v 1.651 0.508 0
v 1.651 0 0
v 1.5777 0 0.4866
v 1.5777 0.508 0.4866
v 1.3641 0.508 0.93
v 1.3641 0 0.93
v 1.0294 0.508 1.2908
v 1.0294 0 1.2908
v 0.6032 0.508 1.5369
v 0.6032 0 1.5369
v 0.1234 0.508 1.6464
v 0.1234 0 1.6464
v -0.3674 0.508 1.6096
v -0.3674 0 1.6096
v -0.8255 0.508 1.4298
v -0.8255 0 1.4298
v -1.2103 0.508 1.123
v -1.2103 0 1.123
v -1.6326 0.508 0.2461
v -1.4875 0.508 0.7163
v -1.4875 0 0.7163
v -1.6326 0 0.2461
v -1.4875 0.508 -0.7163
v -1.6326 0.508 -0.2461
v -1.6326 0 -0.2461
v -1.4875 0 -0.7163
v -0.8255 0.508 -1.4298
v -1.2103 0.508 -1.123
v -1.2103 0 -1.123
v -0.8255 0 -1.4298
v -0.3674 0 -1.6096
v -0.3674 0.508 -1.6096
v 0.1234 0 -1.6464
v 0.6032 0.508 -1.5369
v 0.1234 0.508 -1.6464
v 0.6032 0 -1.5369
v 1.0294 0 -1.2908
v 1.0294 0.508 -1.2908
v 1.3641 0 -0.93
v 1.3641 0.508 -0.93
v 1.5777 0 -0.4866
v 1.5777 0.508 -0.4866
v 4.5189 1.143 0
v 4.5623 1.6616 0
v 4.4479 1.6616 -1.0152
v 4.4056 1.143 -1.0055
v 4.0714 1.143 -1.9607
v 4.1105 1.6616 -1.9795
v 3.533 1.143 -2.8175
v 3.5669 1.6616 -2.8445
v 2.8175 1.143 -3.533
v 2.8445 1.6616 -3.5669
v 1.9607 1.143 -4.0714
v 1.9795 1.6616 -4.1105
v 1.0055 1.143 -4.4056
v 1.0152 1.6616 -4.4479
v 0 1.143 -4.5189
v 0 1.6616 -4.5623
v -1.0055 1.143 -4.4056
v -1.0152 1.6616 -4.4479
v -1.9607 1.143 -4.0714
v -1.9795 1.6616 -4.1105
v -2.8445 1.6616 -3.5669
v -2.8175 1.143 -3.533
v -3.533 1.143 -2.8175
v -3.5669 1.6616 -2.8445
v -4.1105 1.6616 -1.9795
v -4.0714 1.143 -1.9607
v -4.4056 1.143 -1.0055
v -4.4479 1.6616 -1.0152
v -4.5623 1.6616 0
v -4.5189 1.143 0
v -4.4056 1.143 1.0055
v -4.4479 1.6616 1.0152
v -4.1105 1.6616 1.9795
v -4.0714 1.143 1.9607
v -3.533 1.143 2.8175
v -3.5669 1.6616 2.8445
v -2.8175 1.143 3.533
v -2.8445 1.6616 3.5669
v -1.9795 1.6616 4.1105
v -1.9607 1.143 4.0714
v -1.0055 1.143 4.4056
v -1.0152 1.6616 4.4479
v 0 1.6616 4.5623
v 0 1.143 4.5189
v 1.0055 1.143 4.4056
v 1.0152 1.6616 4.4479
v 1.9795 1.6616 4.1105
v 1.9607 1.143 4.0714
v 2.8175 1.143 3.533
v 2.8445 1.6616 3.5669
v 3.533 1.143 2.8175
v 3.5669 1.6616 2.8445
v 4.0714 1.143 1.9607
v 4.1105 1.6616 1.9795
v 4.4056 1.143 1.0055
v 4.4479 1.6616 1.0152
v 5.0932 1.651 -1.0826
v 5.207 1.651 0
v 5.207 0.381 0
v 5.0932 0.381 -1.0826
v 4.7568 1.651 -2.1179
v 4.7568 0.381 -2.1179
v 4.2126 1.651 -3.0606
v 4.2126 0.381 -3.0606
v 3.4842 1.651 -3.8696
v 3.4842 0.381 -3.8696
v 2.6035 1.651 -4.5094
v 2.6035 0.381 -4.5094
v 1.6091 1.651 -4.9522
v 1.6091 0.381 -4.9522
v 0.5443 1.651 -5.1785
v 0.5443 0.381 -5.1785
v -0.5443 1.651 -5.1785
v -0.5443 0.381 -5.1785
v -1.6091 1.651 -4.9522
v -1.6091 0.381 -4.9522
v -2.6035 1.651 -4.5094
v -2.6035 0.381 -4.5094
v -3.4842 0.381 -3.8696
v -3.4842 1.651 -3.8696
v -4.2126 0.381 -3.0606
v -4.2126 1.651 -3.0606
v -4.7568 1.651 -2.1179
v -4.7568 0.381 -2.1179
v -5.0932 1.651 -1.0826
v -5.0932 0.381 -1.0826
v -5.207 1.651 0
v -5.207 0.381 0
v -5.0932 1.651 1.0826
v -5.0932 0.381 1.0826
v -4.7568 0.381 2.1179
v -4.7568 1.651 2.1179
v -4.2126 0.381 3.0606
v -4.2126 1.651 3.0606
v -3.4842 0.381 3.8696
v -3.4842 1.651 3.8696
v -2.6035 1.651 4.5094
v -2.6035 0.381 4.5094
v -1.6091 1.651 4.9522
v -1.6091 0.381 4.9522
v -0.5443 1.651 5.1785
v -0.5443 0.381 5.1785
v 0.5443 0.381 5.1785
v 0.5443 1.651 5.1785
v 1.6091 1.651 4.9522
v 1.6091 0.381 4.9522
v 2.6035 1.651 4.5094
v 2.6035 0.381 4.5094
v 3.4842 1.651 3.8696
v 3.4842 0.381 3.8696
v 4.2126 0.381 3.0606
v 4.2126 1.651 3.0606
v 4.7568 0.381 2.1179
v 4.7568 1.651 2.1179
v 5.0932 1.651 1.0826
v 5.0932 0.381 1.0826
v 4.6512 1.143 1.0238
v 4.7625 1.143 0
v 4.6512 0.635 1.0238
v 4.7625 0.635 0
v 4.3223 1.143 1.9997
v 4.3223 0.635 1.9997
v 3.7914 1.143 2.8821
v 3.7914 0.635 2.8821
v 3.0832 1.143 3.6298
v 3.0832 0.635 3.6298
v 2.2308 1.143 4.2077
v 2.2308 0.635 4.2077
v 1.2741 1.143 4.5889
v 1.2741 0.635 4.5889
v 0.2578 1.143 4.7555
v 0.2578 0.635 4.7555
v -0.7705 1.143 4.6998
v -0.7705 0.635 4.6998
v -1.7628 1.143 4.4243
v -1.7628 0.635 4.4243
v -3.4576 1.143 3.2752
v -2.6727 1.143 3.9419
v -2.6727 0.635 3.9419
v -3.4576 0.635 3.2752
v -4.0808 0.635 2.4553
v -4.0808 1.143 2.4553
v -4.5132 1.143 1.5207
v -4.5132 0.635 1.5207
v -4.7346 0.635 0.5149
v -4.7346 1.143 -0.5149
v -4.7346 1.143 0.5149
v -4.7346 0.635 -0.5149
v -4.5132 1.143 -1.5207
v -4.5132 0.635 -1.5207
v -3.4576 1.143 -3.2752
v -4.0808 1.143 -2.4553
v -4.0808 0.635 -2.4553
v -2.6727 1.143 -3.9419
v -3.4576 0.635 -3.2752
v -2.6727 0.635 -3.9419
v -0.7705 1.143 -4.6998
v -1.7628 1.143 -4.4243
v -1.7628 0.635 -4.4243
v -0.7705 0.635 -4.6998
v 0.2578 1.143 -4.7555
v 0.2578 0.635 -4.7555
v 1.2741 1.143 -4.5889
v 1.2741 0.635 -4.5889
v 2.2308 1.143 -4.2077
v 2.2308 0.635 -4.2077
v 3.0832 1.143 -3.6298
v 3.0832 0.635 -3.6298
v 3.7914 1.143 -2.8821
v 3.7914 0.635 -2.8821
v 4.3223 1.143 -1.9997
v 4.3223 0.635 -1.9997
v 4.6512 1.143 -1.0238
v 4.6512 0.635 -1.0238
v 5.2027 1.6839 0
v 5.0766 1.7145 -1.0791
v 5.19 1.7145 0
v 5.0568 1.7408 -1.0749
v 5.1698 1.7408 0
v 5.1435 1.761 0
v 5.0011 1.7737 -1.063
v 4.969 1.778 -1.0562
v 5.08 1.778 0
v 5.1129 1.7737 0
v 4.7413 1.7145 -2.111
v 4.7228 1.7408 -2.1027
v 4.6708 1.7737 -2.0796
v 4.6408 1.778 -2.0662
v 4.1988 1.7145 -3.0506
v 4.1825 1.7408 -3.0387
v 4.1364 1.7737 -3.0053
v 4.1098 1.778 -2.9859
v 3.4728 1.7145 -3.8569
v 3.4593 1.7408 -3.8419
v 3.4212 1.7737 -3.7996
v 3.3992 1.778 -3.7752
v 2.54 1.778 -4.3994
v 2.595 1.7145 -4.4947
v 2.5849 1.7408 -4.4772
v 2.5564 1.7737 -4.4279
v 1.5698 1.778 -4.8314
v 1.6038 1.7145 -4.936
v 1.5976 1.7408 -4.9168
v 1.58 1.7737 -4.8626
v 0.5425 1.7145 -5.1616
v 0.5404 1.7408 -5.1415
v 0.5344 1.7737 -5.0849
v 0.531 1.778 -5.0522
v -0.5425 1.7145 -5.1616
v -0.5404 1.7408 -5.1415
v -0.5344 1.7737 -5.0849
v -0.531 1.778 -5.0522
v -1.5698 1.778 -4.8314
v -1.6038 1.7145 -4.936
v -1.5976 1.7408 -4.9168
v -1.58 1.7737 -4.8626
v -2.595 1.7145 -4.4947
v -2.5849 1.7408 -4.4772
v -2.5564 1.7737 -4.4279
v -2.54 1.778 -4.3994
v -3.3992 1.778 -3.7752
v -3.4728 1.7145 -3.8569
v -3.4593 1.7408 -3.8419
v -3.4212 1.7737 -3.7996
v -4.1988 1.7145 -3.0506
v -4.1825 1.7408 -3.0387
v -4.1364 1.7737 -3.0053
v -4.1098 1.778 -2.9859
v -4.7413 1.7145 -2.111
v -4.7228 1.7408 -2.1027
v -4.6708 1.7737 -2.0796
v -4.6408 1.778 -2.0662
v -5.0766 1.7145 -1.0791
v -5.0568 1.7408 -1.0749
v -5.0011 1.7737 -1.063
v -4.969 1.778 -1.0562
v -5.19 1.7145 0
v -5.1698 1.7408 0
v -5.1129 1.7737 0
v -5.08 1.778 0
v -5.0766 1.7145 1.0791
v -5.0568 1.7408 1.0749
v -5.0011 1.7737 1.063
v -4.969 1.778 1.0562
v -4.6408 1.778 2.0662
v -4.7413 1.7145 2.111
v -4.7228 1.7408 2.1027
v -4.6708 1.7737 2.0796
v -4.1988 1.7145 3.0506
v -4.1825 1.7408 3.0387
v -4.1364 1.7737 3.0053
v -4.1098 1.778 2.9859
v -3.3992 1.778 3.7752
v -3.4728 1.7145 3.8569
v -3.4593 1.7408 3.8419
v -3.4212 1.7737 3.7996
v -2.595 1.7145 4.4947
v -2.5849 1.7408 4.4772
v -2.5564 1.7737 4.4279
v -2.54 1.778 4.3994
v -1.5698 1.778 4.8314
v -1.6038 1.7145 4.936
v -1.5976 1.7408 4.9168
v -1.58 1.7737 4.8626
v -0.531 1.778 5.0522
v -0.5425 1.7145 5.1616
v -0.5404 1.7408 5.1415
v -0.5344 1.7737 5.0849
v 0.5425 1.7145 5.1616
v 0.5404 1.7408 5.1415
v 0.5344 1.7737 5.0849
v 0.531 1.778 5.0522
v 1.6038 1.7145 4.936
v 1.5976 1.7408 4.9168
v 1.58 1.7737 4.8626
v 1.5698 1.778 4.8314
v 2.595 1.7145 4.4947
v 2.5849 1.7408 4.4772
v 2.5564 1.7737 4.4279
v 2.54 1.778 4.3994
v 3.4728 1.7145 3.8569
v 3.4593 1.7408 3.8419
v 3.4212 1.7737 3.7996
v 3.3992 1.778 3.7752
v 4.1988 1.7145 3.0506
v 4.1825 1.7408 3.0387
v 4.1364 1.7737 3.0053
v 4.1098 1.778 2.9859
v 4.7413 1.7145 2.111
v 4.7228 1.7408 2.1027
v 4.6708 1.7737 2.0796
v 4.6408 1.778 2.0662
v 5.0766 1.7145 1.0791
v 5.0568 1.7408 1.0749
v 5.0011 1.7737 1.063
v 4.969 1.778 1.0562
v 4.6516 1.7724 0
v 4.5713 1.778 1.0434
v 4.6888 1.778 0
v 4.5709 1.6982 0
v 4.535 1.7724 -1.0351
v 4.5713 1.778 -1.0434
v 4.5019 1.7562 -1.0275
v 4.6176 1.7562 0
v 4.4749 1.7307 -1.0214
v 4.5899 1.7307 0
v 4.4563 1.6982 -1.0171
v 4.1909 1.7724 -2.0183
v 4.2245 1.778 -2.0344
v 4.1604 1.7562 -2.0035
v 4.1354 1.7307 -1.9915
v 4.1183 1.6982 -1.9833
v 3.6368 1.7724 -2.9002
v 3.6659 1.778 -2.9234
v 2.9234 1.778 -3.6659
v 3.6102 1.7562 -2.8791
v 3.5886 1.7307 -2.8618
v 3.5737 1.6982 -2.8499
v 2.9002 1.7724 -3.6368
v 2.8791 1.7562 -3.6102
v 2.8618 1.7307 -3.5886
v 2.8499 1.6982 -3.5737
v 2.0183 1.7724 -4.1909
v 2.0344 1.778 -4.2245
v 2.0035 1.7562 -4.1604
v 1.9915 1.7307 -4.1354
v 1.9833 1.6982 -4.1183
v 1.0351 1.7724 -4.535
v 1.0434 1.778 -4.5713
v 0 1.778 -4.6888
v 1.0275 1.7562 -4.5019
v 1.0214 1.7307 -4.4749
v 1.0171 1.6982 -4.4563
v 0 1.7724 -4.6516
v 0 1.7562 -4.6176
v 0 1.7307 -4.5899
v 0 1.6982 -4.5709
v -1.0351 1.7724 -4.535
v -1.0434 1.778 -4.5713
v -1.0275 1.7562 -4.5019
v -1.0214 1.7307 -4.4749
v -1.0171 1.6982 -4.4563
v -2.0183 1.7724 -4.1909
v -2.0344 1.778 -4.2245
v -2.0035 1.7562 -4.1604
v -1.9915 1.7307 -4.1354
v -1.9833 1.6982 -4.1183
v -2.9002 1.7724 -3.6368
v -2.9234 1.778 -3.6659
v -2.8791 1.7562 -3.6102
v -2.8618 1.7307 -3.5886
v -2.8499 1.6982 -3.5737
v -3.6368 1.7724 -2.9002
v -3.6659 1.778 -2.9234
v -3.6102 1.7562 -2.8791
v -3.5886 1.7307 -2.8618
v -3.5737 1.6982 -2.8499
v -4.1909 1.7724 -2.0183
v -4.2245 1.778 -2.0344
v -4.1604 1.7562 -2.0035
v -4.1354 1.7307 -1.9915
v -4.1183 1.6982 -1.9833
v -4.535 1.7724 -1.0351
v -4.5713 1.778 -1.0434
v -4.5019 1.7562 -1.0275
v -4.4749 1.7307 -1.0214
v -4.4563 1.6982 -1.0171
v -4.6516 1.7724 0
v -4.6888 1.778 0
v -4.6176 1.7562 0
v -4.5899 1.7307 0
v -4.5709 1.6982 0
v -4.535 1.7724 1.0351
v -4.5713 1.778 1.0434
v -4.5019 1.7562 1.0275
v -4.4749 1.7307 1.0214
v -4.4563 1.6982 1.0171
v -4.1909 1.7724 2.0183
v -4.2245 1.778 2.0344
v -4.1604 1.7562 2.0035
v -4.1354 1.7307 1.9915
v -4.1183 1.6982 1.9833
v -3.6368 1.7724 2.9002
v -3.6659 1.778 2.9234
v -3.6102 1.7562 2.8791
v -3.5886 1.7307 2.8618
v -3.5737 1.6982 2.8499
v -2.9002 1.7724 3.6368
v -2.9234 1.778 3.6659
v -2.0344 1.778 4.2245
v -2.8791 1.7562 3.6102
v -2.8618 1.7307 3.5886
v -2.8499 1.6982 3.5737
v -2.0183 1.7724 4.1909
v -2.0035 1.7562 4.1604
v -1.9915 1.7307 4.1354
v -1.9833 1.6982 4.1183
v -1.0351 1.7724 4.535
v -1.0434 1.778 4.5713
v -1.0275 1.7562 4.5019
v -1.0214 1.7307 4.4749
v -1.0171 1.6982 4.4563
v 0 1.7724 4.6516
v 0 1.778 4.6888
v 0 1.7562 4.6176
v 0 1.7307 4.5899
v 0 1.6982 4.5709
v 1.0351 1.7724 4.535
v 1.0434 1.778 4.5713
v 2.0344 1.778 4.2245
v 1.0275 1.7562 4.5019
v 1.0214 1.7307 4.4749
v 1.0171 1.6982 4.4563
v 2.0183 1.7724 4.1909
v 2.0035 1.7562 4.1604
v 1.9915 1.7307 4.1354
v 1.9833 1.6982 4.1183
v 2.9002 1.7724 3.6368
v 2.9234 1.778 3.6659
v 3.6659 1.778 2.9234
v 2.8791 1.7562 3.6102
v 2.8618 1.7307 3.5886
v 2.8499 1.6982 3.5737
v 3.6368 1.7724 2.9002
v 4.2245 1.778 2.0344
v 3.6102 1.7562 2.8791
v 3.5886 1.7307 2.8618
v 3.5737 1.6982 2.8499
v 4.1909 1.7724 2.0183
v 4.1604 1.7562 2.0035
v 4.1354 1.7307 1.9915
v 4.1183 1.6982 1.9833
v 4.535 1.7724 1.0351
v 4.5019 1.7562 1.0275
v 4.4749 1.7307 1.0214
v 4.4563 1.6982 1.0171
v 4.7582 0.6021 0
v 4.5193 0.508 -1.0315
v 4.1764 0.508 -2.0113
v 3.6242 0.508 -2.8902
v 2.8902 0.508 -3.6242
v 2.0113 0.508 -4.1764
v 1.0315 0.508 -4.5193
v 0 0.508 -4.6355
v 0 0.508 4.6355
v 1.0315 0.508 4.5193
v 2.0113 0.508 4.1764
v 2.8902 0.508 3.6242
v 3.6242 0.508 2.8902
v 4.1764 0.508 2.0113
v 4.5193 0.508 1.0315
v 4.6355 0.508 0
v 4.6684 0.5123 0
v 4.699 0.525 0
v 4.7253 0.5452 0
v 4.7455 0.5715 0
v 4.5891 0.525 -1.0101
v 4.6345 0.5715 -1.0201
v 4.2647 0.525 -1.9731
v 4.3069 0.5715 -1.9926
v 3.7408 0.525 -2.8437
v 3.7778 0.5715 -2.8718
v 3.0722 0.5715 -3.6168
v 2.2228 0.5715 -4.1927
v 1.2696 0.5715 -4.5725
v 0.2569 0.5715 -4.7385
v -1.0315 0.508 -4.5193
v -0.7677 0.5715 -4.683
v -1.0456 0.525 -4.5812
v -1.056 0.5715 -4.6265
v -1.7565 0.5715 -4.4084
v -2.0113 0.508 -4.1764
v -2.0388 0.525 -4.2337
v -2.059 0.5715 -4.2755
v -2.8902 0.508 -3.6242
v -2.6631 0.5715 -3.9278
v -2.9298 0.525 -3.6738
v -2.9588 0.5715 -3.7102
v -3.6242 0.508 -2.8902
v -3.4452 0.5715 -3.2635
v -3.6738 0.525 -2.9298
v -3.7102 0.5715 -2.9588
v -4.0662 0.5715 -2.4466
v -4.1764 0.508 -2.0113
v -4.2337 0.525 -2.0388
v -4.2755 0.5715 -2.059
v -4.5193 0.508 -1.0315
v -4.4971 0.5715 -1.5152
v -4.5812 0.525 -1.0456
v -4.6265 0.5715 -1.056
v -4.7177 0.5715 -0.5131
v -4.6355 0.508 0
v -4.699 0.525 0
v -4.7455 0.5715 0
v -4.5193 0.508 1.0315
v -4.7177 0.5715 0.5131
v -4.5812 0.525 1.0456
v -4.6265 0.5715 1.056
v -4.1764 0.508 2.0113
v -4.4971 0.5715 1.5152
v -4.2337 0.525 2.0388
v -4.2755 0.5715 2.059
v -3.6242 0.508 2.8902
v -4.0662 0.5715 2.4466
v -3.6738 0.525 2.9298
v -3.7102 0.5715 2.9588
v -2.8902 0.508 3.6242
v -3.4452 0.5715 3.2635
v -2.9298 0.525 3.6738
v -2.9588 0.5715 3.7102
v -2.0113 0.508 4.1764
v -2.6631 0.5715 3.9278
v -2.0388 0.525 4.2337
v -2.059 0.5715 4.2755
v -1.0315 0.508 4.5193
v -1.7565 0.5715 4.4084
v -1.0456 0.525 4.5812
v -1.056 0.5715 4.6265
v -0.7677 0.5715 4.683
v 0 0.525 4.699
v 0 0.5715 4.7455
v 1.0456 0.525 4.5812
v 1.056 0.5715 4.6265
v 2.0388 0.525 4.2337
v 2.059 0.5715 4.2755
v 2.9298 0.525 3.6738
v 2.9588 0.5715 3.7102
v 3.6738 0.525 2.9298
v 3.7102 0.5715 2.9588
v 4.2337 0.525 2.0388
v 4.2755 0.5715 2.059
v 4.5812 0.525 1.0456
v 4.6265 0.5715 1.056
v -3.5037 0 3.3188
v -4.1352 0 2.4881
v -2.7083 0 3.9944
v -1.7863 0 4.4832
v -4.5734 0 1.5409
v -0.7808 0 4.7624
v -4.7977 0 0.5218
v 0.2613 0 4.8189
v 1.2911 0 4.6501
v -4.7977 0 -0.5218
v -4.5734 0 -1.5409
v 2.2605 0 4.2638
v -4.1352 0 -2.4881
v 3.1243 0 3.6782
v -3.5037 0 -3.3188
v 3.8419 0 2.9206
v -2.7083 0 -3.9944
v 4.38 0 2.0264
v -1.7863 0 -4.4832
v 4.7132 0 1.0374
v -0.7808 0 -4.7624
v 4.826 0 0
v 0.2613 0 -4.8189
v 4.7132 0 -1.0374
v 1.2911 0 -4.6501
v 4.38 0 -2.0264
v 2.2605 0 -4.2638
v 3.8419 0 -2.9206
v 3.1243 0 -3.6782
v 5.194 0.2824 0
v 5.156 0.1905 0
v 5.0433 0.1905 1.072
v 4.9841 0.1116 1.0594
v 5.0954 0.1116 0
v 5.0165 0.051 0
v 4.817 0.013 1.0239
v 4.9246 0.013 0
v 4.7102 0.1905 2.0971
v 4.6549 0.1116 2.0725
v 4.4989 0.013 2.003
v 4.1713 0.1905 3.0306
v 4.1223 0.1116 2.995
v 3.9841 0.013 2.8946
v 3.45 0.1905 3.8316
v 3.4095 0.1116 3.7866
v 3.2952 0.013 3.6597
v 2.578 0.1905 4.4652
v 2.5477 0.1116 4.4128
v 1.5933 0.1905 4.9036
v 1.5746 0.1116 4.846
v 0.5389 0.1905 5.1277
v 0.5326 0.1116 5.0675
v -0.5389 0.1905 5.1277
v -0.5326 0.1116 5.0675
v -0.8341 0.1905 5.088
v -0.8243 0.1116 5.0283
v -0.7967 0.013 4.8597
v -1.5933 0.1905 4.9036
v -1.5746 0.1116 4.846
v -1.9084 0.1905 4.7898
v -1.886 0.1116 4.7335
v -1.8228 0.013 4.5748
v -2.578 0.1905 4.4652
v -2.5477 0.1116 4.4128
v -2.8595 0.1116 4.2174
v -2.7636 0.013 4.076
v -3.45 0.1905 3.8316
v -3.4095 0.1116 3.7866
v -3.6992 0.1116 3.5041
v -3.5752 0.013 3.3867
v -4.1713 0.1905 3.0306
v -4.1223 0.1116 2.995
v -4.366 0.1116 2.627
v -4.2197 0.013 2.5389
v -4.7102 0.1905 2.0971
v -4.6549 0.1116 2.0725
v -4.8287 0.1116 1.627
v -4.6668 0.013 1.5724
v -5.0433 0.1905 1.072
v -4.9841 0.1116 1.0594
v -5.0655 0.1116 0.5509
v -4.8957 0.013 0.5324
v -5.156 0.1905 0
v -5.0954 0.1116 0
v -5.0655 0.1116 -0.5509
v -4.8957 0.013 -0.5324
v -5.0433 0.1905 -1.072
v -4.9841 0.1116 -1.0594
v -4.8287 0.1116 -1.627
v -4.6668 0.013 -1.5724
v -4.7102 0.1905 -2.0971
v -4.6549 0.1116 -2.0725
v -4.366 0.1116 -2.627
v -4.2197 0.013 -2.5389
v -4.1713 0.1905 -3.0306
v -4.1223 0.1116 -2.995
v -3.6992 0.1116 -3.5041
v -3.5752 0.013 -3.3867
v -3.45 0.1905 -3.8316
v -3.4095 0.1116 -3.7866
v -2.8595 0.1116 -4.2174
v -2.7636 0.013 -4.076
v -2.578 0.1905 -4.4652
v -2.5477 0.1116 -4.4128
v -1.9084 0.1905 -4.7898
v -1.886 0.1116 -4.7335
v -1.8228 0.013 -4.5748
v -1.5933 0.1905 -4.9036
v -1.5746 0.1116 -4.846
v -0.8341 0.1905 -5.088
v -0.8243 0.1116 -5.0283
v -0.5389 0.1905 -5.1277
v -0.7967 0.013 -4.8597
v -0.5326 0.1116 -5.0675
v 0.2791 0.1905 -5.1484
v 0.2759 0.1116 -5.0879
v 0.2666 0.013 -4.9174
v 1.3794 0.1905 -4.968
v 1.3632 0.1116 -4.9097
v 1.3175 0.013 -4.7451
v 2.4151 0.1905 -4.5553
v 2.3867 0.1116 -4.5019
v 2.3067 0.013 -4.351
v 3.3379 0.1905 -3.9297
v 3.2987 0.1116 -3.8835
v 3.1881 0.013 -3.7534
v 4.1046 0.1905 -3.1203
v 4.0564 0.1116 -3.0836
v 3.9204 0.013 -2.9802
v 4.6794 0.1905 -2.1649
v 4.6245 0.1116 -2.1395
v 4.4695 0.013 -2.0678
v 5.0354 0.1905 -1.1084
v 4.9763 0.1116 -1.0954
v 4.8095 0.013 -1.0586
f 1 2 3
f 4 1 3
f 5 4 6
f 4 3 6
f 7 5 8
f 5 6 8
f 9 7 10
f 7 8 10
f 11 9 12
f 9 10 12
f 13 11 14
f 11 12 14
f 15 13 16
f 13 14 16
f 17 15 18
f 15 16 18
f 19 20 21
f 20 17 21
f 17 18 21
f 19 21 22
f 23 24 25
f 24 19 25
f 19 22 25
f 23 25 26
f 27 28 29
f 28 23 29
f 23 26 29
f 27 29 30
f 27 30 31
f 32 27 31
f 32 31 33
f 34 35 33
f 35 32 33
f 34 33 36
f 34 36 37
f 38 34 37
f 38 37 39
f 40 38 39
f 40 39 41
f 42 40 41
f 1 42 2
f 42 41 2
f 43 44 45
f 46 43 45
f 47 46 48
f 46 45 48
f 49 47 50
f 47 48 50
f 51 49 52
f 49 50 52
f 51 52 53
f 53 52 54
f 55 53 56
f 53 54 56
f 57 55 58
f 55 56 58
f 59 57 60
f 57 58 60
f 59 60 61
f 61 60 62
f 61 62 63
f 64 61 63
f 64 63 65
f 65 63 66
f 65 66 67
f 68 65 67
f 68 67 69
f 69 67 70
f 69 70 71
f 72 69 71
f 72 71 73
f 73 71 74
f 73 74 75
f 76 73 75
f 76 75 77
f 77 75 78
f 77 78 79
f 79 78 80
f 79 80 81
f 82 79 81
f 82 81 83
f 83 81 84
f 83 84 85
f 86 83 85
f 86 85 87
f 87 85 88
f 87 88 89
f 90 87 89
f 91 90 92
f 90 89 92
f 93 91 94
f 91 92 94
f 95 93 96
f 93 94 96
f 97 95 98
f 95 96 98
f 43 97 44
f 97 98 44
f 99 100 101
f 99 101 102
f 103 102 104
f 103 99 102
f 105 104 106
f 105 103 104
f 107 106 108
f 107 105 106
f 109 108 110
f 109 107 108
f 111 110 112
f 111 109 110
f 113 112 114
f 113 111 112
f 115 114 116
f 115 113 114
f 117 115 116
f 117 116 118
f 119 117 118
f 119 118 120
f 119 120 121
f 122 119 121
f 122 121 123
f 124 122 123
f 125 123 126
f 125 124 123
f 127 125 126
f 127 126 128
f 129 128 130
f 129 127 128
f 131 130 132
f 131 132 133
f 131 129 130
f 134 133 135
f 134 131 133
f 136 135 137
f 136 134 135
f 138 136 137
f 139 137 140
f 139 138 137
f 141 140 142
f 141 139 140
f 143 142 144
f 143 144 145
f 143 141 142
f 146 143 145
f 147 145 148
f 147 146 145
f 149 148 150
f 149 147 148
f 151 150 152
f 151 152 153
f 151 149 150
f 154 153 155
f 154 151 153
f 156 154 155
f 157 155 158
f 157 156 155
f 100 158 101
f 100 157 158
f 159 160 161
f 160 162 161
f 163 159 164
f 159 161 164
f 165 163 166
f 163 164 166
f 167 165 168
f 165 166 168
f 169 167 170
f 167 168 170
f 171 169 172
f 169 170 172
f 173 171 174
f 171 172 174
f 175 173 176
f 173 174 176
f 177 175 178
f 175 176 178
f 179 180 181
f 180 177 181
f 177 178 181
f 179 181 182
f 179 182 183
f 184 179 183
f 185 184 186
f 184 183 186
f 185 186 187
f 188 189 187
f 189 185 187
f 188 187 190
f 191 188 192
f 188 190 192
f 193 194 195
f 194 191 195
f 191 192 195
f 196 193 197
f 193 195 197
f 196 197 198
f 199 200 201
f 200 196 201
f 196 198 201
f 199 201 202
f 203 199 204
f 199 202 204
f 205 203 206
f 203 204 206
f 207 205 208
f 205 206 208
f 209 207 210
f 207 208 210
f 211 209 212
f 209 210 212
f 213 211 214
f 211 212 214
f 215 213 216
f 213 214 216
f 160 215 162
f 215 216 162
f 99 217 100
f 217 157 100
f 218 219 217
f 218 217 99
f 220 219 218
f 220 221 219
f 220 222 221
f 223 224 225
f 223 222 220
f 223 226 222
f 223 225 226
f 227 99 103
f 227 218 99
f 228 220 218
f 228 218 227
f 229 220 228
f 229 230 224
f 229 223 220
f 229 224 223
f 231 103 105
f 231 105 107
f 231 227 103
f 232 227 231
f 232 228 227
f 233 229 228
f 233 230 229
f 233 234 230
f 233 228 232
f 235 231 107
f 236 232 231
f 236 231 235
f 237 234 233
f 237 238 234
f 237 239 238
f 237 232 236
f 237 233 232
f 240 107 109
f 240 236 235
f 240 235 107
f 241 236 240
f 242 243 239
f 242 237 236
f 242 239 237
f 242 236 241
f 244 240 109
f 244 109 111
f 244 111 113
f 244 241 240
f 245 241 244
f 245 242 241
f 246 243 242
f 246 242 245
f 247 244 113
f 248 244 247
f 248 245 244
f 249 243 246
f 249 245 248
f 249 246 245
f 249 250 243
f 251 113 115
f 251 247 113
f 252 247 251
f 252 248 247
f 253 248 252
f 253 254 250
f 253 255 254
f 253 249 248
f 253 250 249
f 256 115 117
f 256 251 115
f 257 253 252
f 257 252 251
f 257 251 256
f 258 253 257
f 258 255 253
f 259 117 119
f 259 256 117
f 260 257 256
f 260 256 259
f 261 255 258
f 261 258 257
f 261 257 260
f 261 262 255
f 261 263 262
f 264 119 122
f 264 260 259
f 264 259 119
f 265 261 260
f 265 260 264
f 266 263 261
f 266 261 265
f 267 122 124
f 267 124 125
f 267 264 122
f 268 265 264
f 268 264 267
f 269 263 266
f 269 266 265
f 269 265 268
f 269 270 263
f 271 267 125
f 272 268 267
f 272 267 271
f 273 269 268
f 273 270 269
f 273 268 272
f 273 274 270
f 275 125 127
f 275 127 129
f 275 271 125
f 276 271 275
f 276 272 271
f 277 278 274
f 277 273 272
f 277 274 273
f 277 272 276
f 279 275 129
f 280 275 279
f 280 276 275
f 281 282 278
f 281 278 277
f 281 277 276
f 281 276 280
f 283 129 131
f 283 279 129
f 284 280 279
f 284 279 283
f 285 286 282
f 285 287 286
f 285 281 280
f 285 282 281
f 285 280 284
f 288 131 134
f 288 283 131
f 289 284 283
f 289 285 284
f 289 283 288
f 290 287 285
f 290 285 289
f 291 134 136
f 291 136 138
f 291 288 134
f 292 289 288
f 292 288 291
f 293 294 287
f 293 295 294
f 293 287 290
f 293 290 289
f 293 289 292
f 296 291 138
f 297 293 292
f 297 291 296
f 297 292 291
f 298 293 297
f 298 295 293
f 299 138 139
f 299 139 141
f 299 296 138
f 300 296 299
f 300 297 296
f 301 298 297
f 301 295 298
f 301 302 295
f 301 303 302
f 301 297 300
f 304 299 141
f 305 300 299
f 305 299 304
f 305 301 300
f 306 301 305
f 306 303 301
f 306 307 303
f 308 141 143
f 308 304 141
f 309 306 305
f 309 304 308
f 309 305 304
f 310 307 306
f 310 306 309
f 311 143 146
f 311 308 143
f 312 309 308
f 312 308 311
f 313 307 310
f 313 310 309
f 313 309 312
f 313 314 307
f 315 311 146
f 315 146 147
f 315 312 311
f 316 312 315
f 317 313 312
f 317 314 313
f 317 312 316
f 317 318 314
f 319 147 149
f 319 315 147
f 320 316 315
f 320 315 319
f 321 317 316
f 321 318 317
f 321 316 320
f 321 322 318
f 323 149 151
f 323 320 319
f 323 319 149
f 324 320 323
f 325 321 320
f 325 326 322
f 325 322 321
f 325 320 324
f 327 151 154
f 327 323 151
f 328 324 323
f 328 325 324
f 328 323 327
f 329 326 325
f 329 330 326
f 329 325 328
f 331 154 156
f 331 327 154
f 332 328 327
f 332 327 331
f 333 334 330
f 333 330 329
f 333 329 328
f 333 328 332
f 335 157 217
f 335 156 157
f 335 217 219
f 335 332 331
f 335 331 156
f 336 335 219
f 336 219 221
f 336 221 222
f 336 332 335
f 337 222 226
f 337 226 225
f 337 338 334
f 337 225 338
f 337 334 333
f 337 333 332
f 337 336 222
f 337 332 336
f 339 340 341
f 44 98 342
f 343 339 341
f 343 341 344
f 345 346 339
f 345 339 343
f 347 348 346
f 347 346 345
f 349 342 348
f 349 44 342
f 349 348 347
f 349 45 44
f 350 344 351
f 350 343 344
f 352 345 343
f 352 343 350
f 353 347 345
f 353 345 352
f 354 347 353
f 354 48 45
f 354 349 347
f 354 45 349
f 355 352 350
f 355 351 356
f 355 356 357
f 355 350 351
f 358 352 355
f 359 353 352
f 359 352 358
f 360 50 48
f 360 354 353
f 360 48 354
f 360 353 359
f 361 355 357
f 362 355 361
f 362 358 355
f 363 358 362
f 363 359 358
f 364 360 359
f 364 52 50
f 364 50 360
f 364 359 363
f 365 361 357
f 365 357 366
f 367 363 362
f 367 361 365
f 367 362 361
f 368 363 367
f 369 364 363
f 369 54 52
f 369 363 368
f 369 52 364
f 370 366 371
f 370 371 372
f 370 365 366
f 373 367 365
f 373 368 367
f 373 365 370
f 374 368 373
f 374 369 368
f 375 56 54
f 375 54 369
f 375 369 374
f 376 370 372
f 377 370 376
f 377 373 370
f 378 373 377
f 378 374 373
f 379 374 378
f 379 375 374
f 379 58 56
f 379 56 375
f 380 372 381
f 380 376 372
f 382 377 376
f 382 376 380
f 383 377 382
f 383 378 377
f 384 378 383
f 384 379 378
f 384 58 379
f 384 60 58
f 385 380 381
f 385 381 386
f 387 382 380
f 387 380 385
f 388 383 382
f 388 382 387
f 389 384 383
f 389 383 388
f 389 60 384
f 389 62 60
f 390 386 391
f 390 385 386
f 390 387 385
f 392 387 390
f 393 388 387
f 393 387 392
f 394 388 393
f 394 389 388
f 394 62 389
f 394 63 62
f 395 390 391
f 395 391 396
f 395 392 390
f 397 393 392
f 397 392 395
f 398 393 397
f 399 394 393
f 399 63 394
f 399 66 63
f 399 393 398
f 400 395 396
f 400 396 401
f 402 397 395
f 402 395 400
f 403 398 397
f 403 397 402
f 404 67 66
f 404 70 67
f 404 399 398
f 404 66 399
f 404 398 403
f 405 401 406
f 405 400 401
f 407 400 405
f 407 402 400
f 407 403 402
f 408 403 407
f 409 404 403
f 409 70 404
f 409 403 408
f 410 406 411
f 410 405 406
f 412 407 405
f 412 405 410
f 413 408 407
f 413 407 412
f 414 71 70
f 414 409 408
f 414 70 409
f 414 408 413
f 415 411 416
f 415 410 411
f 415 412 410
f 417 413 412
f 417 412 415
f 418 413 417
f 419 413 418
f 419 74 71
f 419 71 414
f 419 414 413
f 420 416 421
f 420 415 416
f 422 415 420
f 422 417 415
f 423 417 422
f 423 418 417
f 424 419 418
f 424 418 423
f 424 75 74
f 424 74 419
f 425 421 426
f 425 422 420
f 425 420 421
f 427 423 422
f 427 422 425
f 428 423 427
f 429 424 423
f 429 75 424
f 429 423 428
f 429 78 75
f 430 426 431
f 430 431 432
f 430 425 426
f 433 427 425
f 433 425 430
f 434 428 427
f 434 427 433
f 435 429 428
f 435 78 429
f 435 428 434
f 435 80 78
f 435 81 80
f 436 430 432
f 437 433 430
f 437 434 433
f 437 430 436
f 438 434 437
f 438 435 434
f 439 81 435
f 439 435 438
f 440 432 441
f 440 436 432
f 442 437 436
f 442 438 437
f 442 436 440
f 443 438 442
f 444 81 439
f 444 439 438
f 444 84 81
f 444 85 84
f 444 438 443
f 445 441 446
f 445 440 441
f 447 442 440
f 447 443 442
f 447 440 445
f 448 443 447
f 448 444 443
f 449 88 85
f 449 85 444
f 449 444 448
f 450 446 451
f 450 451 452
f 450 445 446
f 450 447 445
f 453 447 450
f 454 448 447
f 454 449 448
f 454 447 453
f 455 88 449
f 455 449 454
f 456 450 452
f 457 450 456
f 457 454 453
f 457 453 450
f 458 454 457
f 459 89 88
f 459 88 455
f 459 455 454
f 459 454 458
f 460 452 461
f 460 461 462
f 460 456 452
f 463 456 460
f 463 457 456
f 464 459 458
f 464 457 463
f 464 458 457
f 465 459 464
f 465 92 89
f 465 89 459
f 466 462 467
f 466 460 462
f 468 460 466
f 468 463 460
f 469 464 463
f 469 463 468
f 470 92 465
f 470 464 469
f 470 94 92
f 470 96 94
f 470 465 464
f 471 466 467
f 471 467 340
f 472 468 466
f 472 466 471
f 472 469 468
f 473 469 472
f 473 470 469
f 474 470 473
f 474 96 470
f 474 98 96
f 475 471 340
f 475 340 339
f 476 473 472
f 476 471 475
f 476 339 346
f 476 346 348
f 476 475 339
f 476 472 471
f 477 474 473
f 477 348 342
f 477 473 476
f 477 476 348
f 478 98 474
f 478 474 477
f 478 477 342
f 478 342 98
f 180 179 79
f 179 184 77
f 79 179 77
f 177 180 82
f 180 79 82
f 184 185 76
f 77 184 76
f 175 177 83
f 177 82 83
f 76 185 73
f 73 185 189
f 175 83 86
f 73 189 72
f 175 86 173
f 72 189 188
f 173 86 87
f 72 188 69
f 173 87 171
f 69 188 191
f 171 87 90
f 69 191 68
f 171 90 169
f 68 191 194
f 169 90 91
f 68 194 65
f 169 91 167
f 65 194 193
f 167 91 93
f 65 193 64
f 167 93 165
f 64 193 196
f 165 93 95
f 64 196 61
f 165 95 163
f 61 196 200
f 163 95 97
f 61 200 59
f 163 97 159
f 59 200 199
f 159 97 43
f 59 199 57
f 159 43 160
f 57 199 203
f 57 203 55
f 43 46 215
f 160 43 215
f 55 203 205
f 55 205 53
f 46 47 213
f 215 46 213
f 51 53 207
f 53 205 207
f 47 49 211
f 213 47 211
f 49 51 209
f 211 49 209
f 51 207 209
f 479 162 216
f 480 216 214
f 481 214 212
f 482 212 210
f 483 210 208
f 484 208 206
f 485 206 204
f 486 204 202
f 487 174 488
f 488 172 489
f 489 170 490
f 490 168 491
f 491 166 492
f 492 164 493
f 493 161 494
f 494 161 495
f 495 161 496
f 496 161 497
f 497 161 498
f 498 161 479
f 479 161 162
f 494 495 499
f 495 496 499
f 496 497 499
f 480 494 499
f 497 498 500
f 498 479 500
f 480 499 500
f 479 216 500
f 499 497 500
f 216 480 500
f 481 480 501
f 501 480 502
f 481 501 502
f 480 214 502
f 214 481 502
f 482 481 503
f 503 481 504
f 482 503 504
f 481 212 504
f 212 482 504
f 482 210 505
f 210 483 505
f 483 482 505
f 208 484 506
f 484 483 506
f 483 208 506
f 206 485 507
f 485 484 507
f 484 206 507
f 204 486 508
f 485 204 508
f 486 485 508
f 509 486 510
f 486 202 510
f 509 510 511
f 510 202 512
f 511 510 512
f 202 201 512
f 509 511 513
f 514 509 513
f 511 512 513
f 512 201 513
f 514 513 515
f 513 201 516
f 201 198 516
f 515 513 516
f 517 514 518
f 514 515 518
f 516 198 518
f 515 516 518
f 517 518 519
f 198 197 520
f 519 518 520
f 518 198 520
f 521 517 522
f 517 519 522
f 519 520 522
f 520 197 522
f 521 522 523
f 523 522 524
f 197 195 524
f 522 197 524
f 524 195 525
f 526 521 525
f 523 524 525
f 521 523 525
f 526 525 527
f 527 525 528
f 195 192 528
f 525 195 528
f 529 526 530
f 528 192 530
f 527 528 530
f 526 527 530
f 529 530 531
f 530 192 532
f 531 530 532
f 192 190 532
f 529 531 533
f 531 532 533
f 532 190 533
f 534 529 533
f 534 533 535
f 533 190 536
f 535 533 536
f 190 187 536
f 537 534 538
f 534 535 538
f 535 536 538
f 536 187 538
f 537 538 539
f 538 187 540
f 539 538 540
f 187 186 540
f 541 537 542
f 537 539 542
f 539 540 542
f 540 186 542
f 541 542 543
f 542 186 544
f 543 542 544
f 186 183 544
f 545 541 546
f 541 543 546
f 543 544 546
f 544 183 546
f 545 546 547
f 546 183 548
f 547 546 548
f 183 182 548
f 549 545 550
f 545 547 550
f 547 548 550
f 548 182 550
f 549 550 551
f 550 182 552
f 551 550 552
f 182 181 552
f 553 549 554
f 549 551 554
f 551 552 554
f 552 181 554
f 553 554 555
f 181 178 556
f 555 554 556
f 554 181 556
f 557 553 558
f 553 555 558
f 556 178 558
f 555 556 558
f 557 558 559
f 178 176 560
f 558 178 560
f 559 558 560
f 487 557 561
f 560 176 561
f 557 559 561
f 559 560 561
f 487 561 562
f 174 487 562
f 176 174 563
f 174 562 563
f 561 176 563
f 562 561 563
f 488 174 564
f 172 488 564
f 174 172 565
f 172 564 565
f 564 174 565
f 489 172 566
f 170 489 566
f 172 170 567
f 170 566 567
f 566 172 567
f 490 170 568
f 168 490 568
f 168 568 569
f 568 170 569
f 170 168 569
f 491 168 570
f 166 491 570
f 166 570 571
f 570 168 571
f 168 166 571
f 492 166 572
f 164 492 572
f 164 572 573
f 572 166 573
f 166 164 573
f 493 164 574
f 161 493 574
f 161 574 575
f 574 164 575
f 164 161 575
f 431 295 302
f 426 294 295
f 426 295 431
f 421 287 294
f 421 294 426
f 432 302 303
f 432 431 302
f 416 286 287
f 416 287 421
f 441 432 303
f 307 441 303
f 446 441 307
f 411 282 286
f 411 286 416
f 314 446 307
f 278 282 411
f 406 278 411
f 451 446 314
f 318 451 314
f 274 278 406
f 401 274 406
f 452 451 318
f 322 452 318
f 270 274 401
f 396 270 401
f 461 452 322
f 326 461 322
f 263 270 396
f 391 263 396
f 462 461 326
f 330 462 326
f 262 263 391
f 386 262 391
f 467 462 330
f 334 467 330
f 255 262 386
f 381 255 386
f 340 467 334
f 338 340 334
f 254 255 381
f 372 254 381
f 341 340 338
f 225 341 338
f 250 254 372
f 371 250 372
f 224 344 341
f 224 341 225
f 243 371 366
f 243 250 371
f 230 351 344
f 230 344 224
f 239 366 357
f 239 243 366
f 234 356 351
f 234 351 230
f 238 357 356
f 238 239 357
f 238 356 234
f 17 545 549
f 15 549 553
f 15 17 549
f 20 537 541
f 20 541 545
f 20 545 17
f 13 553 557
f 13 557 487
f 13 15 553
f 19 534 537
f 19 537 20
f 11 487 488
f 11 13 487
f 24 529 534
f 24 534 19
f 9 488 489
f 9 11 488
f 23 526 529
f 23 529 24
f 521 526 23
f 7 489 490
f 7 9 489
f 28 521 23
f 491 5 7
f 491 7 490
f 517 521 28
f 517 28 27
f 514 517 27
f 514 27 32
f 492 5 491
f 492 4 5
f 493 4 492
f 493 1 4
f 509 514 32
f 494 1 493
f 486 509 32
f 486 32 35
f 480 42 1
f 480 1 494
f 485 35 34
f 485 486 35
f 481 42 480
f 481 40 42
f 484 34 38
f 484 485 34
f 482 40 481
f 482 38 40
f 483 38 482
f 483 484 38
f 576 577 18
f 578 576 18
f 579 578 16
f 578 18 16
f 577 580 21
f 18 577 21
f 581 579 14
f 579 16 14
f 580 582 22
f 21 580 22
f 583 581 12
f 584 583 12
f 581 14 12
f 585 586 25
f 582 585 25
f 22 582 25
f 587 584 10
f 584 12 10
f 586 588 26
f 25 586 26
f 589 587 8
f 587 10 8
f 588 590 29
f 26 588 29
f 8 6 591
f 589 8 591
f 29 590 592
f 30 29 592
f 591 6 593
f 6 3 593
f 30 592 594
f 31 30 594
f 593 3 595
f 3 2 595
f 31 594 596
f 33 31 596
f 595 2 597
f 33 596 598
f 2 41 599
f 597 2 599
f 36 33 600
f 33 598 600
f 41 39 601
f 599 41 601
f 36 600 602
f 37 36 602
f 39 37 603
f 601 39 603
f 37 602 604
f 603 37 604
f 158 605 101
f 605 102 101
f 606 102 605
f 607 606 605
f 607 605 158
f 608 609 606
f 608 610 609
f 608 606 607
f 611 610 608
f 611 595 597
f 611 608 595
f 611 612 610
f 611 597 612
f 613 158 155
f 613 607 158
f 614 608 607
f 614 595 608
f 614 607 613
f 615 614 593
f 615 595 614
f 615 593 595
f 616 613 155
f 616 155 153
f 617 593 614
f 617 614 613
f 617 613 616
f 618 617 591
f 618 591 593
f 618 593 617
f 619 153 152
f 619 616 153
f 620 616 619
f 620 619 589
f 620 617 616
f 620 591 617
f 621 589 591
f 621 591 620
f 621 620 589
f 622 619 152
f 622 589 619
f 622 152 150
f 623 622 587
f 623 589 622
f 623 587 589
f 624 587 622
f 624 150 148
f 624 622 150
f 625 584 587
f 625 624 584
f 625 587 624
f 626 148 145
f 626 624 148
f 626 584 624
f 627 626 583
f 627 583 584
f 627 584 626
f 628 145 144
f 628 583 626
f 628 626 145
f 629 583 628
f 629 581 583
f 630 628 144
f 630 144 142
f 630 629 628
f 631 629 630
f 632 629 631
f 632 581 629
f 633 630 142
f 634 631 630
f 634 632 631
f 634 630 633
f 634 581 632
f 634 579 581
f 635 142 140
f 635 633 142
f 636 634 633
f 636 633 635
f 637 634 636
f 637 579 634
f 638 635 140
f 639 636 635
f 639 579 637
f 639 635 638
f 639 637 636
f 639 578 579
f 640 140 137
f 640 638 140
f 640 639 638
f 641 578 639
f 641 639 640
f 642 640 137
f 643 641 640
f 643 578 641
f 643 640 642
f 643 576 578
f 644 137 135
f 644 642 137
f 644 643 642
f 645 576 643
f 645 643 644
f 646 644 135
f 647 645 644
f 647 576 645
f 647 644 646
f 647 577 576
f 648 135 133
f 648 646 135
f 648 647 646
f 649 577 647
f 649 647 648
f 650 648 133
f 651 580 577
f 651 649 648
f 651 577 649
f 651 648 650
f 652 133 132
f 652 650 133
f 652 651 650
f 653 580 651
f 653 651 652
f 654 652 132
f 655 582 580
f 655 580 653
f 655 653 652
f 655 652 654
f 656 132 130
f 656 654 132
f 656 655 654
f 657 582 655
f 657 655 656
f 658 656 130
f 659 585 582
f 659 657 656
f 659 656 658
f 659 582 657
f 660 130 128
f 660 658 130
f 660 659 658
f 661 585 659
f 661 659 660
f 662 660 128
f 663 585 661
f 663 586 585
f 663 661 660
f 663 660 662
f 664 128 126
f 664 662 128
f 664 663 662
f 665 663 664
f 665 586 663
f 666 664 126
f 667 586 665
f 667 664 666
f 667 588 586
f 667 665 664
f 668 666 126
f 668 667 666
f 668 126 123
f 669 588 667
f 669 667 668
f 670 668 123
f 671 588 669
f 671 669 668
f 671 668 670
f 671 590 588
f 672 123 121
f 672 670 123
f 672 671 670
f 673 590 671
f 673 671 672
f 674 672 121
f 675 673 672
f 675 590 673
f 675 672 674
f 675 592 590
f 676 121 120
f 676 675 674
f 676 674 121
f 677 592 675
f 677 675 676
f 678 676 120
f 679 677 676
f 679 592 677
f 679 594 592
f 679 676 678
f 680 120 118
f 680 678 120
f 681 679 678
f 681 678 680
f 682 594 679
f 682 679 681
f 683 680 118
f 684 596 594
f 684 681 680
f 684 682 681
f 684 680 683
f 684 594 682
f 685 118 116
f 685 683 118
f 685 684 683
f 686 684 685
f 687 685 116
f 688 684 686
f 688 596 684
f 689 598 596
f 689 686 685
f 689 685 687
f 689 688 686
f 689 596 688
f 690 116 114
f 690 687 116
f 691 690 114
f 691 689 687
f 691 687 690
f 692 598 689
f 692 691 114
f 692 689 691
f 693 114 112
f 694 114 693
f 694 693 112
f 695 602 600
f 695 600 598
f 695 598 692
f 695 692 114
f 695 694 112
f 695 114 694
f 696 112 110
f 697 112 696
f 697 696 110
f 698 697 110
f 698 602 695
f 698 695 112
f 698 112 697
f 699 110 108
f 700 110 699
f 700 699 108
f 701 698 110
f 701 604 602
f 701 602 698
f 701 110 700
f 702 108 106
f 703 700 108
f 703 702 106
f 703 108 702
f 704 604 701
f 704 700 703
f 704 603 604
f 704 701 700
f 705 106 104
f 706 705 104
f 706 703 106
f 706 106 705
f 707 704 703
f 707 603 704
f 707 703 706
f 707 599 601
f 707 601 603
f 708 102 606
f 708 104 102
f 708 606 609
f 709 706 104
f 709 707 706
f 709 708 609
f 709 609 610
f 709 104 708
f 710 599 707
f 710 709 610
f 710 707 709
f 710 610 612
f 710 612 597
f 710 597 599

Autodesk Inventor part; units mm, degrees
ref_plane "YZ Plane" through (0, 0, 0) normal (1, 0, 0) x (0, 1, 0)
ref_plane "XZ Plane" through (0, 0, 0) normal (0, 1, 0) x (-1, 0, 0)
ref_plane "XY Plane" through (0, 0, 0) normal (0, 0, 1) x (1, 0, 0)
sketch "Sketch1" plane through (0, 0, 0) normal (0, 0, 1) x (1, 0, 0)
  line L0 (-1.0414, 0) -> (6.2484, 0) construction
  line L1 (0, -0.3556) -> (0, 2.1336) construction
  line L2 (1.651, 0) -> (5.207, 0)
  line L3 (5.207, 0) -> (5.207, 1.778)
  line L4 (5.207, 1.778) -> (4.572, 1.778)
  line L5 (4.572, 1.778) -> (4.5189, 1.143)
  line L6 (4.5189, 1.143) -> (4.7625, 1.143)
  line L7 (4.7625, 1.143) -> (4.7625, 0.508)
  line L8 (4.7625, 0.508) -> (1.651, 0.508)
  line L9 (1.651, 0.508) -> (1.651, 0)
  point P0 (0, 0)
  dimension "d0" = 3.302
  dimension "d1" = 10.414
  dimension "d2" = 1.778
  dimension "d3" = 0.635
  dimension "d4" = 9.0378
  dimension "d5" = 9.525
  dimension "d6" = 0.508
  dimension "d7" = 0.635
revolve "Revolution1" add sketch "Sketch1" angle 360 about axis through (0, -10, 0) along (0, 1, 0)
fillet "Fillet1" radius 0.381 1 edges at (-5.207, 0, 0)
fillet "Fillet2" radius 0.127 3 edges at (-5.207, 1.778, 0) (-4.572, 1.778, 0) (-4.7625, 0.508, 0)
equation "\"d7\" = d3"
properties part number "Shock Cartridge Cover"
